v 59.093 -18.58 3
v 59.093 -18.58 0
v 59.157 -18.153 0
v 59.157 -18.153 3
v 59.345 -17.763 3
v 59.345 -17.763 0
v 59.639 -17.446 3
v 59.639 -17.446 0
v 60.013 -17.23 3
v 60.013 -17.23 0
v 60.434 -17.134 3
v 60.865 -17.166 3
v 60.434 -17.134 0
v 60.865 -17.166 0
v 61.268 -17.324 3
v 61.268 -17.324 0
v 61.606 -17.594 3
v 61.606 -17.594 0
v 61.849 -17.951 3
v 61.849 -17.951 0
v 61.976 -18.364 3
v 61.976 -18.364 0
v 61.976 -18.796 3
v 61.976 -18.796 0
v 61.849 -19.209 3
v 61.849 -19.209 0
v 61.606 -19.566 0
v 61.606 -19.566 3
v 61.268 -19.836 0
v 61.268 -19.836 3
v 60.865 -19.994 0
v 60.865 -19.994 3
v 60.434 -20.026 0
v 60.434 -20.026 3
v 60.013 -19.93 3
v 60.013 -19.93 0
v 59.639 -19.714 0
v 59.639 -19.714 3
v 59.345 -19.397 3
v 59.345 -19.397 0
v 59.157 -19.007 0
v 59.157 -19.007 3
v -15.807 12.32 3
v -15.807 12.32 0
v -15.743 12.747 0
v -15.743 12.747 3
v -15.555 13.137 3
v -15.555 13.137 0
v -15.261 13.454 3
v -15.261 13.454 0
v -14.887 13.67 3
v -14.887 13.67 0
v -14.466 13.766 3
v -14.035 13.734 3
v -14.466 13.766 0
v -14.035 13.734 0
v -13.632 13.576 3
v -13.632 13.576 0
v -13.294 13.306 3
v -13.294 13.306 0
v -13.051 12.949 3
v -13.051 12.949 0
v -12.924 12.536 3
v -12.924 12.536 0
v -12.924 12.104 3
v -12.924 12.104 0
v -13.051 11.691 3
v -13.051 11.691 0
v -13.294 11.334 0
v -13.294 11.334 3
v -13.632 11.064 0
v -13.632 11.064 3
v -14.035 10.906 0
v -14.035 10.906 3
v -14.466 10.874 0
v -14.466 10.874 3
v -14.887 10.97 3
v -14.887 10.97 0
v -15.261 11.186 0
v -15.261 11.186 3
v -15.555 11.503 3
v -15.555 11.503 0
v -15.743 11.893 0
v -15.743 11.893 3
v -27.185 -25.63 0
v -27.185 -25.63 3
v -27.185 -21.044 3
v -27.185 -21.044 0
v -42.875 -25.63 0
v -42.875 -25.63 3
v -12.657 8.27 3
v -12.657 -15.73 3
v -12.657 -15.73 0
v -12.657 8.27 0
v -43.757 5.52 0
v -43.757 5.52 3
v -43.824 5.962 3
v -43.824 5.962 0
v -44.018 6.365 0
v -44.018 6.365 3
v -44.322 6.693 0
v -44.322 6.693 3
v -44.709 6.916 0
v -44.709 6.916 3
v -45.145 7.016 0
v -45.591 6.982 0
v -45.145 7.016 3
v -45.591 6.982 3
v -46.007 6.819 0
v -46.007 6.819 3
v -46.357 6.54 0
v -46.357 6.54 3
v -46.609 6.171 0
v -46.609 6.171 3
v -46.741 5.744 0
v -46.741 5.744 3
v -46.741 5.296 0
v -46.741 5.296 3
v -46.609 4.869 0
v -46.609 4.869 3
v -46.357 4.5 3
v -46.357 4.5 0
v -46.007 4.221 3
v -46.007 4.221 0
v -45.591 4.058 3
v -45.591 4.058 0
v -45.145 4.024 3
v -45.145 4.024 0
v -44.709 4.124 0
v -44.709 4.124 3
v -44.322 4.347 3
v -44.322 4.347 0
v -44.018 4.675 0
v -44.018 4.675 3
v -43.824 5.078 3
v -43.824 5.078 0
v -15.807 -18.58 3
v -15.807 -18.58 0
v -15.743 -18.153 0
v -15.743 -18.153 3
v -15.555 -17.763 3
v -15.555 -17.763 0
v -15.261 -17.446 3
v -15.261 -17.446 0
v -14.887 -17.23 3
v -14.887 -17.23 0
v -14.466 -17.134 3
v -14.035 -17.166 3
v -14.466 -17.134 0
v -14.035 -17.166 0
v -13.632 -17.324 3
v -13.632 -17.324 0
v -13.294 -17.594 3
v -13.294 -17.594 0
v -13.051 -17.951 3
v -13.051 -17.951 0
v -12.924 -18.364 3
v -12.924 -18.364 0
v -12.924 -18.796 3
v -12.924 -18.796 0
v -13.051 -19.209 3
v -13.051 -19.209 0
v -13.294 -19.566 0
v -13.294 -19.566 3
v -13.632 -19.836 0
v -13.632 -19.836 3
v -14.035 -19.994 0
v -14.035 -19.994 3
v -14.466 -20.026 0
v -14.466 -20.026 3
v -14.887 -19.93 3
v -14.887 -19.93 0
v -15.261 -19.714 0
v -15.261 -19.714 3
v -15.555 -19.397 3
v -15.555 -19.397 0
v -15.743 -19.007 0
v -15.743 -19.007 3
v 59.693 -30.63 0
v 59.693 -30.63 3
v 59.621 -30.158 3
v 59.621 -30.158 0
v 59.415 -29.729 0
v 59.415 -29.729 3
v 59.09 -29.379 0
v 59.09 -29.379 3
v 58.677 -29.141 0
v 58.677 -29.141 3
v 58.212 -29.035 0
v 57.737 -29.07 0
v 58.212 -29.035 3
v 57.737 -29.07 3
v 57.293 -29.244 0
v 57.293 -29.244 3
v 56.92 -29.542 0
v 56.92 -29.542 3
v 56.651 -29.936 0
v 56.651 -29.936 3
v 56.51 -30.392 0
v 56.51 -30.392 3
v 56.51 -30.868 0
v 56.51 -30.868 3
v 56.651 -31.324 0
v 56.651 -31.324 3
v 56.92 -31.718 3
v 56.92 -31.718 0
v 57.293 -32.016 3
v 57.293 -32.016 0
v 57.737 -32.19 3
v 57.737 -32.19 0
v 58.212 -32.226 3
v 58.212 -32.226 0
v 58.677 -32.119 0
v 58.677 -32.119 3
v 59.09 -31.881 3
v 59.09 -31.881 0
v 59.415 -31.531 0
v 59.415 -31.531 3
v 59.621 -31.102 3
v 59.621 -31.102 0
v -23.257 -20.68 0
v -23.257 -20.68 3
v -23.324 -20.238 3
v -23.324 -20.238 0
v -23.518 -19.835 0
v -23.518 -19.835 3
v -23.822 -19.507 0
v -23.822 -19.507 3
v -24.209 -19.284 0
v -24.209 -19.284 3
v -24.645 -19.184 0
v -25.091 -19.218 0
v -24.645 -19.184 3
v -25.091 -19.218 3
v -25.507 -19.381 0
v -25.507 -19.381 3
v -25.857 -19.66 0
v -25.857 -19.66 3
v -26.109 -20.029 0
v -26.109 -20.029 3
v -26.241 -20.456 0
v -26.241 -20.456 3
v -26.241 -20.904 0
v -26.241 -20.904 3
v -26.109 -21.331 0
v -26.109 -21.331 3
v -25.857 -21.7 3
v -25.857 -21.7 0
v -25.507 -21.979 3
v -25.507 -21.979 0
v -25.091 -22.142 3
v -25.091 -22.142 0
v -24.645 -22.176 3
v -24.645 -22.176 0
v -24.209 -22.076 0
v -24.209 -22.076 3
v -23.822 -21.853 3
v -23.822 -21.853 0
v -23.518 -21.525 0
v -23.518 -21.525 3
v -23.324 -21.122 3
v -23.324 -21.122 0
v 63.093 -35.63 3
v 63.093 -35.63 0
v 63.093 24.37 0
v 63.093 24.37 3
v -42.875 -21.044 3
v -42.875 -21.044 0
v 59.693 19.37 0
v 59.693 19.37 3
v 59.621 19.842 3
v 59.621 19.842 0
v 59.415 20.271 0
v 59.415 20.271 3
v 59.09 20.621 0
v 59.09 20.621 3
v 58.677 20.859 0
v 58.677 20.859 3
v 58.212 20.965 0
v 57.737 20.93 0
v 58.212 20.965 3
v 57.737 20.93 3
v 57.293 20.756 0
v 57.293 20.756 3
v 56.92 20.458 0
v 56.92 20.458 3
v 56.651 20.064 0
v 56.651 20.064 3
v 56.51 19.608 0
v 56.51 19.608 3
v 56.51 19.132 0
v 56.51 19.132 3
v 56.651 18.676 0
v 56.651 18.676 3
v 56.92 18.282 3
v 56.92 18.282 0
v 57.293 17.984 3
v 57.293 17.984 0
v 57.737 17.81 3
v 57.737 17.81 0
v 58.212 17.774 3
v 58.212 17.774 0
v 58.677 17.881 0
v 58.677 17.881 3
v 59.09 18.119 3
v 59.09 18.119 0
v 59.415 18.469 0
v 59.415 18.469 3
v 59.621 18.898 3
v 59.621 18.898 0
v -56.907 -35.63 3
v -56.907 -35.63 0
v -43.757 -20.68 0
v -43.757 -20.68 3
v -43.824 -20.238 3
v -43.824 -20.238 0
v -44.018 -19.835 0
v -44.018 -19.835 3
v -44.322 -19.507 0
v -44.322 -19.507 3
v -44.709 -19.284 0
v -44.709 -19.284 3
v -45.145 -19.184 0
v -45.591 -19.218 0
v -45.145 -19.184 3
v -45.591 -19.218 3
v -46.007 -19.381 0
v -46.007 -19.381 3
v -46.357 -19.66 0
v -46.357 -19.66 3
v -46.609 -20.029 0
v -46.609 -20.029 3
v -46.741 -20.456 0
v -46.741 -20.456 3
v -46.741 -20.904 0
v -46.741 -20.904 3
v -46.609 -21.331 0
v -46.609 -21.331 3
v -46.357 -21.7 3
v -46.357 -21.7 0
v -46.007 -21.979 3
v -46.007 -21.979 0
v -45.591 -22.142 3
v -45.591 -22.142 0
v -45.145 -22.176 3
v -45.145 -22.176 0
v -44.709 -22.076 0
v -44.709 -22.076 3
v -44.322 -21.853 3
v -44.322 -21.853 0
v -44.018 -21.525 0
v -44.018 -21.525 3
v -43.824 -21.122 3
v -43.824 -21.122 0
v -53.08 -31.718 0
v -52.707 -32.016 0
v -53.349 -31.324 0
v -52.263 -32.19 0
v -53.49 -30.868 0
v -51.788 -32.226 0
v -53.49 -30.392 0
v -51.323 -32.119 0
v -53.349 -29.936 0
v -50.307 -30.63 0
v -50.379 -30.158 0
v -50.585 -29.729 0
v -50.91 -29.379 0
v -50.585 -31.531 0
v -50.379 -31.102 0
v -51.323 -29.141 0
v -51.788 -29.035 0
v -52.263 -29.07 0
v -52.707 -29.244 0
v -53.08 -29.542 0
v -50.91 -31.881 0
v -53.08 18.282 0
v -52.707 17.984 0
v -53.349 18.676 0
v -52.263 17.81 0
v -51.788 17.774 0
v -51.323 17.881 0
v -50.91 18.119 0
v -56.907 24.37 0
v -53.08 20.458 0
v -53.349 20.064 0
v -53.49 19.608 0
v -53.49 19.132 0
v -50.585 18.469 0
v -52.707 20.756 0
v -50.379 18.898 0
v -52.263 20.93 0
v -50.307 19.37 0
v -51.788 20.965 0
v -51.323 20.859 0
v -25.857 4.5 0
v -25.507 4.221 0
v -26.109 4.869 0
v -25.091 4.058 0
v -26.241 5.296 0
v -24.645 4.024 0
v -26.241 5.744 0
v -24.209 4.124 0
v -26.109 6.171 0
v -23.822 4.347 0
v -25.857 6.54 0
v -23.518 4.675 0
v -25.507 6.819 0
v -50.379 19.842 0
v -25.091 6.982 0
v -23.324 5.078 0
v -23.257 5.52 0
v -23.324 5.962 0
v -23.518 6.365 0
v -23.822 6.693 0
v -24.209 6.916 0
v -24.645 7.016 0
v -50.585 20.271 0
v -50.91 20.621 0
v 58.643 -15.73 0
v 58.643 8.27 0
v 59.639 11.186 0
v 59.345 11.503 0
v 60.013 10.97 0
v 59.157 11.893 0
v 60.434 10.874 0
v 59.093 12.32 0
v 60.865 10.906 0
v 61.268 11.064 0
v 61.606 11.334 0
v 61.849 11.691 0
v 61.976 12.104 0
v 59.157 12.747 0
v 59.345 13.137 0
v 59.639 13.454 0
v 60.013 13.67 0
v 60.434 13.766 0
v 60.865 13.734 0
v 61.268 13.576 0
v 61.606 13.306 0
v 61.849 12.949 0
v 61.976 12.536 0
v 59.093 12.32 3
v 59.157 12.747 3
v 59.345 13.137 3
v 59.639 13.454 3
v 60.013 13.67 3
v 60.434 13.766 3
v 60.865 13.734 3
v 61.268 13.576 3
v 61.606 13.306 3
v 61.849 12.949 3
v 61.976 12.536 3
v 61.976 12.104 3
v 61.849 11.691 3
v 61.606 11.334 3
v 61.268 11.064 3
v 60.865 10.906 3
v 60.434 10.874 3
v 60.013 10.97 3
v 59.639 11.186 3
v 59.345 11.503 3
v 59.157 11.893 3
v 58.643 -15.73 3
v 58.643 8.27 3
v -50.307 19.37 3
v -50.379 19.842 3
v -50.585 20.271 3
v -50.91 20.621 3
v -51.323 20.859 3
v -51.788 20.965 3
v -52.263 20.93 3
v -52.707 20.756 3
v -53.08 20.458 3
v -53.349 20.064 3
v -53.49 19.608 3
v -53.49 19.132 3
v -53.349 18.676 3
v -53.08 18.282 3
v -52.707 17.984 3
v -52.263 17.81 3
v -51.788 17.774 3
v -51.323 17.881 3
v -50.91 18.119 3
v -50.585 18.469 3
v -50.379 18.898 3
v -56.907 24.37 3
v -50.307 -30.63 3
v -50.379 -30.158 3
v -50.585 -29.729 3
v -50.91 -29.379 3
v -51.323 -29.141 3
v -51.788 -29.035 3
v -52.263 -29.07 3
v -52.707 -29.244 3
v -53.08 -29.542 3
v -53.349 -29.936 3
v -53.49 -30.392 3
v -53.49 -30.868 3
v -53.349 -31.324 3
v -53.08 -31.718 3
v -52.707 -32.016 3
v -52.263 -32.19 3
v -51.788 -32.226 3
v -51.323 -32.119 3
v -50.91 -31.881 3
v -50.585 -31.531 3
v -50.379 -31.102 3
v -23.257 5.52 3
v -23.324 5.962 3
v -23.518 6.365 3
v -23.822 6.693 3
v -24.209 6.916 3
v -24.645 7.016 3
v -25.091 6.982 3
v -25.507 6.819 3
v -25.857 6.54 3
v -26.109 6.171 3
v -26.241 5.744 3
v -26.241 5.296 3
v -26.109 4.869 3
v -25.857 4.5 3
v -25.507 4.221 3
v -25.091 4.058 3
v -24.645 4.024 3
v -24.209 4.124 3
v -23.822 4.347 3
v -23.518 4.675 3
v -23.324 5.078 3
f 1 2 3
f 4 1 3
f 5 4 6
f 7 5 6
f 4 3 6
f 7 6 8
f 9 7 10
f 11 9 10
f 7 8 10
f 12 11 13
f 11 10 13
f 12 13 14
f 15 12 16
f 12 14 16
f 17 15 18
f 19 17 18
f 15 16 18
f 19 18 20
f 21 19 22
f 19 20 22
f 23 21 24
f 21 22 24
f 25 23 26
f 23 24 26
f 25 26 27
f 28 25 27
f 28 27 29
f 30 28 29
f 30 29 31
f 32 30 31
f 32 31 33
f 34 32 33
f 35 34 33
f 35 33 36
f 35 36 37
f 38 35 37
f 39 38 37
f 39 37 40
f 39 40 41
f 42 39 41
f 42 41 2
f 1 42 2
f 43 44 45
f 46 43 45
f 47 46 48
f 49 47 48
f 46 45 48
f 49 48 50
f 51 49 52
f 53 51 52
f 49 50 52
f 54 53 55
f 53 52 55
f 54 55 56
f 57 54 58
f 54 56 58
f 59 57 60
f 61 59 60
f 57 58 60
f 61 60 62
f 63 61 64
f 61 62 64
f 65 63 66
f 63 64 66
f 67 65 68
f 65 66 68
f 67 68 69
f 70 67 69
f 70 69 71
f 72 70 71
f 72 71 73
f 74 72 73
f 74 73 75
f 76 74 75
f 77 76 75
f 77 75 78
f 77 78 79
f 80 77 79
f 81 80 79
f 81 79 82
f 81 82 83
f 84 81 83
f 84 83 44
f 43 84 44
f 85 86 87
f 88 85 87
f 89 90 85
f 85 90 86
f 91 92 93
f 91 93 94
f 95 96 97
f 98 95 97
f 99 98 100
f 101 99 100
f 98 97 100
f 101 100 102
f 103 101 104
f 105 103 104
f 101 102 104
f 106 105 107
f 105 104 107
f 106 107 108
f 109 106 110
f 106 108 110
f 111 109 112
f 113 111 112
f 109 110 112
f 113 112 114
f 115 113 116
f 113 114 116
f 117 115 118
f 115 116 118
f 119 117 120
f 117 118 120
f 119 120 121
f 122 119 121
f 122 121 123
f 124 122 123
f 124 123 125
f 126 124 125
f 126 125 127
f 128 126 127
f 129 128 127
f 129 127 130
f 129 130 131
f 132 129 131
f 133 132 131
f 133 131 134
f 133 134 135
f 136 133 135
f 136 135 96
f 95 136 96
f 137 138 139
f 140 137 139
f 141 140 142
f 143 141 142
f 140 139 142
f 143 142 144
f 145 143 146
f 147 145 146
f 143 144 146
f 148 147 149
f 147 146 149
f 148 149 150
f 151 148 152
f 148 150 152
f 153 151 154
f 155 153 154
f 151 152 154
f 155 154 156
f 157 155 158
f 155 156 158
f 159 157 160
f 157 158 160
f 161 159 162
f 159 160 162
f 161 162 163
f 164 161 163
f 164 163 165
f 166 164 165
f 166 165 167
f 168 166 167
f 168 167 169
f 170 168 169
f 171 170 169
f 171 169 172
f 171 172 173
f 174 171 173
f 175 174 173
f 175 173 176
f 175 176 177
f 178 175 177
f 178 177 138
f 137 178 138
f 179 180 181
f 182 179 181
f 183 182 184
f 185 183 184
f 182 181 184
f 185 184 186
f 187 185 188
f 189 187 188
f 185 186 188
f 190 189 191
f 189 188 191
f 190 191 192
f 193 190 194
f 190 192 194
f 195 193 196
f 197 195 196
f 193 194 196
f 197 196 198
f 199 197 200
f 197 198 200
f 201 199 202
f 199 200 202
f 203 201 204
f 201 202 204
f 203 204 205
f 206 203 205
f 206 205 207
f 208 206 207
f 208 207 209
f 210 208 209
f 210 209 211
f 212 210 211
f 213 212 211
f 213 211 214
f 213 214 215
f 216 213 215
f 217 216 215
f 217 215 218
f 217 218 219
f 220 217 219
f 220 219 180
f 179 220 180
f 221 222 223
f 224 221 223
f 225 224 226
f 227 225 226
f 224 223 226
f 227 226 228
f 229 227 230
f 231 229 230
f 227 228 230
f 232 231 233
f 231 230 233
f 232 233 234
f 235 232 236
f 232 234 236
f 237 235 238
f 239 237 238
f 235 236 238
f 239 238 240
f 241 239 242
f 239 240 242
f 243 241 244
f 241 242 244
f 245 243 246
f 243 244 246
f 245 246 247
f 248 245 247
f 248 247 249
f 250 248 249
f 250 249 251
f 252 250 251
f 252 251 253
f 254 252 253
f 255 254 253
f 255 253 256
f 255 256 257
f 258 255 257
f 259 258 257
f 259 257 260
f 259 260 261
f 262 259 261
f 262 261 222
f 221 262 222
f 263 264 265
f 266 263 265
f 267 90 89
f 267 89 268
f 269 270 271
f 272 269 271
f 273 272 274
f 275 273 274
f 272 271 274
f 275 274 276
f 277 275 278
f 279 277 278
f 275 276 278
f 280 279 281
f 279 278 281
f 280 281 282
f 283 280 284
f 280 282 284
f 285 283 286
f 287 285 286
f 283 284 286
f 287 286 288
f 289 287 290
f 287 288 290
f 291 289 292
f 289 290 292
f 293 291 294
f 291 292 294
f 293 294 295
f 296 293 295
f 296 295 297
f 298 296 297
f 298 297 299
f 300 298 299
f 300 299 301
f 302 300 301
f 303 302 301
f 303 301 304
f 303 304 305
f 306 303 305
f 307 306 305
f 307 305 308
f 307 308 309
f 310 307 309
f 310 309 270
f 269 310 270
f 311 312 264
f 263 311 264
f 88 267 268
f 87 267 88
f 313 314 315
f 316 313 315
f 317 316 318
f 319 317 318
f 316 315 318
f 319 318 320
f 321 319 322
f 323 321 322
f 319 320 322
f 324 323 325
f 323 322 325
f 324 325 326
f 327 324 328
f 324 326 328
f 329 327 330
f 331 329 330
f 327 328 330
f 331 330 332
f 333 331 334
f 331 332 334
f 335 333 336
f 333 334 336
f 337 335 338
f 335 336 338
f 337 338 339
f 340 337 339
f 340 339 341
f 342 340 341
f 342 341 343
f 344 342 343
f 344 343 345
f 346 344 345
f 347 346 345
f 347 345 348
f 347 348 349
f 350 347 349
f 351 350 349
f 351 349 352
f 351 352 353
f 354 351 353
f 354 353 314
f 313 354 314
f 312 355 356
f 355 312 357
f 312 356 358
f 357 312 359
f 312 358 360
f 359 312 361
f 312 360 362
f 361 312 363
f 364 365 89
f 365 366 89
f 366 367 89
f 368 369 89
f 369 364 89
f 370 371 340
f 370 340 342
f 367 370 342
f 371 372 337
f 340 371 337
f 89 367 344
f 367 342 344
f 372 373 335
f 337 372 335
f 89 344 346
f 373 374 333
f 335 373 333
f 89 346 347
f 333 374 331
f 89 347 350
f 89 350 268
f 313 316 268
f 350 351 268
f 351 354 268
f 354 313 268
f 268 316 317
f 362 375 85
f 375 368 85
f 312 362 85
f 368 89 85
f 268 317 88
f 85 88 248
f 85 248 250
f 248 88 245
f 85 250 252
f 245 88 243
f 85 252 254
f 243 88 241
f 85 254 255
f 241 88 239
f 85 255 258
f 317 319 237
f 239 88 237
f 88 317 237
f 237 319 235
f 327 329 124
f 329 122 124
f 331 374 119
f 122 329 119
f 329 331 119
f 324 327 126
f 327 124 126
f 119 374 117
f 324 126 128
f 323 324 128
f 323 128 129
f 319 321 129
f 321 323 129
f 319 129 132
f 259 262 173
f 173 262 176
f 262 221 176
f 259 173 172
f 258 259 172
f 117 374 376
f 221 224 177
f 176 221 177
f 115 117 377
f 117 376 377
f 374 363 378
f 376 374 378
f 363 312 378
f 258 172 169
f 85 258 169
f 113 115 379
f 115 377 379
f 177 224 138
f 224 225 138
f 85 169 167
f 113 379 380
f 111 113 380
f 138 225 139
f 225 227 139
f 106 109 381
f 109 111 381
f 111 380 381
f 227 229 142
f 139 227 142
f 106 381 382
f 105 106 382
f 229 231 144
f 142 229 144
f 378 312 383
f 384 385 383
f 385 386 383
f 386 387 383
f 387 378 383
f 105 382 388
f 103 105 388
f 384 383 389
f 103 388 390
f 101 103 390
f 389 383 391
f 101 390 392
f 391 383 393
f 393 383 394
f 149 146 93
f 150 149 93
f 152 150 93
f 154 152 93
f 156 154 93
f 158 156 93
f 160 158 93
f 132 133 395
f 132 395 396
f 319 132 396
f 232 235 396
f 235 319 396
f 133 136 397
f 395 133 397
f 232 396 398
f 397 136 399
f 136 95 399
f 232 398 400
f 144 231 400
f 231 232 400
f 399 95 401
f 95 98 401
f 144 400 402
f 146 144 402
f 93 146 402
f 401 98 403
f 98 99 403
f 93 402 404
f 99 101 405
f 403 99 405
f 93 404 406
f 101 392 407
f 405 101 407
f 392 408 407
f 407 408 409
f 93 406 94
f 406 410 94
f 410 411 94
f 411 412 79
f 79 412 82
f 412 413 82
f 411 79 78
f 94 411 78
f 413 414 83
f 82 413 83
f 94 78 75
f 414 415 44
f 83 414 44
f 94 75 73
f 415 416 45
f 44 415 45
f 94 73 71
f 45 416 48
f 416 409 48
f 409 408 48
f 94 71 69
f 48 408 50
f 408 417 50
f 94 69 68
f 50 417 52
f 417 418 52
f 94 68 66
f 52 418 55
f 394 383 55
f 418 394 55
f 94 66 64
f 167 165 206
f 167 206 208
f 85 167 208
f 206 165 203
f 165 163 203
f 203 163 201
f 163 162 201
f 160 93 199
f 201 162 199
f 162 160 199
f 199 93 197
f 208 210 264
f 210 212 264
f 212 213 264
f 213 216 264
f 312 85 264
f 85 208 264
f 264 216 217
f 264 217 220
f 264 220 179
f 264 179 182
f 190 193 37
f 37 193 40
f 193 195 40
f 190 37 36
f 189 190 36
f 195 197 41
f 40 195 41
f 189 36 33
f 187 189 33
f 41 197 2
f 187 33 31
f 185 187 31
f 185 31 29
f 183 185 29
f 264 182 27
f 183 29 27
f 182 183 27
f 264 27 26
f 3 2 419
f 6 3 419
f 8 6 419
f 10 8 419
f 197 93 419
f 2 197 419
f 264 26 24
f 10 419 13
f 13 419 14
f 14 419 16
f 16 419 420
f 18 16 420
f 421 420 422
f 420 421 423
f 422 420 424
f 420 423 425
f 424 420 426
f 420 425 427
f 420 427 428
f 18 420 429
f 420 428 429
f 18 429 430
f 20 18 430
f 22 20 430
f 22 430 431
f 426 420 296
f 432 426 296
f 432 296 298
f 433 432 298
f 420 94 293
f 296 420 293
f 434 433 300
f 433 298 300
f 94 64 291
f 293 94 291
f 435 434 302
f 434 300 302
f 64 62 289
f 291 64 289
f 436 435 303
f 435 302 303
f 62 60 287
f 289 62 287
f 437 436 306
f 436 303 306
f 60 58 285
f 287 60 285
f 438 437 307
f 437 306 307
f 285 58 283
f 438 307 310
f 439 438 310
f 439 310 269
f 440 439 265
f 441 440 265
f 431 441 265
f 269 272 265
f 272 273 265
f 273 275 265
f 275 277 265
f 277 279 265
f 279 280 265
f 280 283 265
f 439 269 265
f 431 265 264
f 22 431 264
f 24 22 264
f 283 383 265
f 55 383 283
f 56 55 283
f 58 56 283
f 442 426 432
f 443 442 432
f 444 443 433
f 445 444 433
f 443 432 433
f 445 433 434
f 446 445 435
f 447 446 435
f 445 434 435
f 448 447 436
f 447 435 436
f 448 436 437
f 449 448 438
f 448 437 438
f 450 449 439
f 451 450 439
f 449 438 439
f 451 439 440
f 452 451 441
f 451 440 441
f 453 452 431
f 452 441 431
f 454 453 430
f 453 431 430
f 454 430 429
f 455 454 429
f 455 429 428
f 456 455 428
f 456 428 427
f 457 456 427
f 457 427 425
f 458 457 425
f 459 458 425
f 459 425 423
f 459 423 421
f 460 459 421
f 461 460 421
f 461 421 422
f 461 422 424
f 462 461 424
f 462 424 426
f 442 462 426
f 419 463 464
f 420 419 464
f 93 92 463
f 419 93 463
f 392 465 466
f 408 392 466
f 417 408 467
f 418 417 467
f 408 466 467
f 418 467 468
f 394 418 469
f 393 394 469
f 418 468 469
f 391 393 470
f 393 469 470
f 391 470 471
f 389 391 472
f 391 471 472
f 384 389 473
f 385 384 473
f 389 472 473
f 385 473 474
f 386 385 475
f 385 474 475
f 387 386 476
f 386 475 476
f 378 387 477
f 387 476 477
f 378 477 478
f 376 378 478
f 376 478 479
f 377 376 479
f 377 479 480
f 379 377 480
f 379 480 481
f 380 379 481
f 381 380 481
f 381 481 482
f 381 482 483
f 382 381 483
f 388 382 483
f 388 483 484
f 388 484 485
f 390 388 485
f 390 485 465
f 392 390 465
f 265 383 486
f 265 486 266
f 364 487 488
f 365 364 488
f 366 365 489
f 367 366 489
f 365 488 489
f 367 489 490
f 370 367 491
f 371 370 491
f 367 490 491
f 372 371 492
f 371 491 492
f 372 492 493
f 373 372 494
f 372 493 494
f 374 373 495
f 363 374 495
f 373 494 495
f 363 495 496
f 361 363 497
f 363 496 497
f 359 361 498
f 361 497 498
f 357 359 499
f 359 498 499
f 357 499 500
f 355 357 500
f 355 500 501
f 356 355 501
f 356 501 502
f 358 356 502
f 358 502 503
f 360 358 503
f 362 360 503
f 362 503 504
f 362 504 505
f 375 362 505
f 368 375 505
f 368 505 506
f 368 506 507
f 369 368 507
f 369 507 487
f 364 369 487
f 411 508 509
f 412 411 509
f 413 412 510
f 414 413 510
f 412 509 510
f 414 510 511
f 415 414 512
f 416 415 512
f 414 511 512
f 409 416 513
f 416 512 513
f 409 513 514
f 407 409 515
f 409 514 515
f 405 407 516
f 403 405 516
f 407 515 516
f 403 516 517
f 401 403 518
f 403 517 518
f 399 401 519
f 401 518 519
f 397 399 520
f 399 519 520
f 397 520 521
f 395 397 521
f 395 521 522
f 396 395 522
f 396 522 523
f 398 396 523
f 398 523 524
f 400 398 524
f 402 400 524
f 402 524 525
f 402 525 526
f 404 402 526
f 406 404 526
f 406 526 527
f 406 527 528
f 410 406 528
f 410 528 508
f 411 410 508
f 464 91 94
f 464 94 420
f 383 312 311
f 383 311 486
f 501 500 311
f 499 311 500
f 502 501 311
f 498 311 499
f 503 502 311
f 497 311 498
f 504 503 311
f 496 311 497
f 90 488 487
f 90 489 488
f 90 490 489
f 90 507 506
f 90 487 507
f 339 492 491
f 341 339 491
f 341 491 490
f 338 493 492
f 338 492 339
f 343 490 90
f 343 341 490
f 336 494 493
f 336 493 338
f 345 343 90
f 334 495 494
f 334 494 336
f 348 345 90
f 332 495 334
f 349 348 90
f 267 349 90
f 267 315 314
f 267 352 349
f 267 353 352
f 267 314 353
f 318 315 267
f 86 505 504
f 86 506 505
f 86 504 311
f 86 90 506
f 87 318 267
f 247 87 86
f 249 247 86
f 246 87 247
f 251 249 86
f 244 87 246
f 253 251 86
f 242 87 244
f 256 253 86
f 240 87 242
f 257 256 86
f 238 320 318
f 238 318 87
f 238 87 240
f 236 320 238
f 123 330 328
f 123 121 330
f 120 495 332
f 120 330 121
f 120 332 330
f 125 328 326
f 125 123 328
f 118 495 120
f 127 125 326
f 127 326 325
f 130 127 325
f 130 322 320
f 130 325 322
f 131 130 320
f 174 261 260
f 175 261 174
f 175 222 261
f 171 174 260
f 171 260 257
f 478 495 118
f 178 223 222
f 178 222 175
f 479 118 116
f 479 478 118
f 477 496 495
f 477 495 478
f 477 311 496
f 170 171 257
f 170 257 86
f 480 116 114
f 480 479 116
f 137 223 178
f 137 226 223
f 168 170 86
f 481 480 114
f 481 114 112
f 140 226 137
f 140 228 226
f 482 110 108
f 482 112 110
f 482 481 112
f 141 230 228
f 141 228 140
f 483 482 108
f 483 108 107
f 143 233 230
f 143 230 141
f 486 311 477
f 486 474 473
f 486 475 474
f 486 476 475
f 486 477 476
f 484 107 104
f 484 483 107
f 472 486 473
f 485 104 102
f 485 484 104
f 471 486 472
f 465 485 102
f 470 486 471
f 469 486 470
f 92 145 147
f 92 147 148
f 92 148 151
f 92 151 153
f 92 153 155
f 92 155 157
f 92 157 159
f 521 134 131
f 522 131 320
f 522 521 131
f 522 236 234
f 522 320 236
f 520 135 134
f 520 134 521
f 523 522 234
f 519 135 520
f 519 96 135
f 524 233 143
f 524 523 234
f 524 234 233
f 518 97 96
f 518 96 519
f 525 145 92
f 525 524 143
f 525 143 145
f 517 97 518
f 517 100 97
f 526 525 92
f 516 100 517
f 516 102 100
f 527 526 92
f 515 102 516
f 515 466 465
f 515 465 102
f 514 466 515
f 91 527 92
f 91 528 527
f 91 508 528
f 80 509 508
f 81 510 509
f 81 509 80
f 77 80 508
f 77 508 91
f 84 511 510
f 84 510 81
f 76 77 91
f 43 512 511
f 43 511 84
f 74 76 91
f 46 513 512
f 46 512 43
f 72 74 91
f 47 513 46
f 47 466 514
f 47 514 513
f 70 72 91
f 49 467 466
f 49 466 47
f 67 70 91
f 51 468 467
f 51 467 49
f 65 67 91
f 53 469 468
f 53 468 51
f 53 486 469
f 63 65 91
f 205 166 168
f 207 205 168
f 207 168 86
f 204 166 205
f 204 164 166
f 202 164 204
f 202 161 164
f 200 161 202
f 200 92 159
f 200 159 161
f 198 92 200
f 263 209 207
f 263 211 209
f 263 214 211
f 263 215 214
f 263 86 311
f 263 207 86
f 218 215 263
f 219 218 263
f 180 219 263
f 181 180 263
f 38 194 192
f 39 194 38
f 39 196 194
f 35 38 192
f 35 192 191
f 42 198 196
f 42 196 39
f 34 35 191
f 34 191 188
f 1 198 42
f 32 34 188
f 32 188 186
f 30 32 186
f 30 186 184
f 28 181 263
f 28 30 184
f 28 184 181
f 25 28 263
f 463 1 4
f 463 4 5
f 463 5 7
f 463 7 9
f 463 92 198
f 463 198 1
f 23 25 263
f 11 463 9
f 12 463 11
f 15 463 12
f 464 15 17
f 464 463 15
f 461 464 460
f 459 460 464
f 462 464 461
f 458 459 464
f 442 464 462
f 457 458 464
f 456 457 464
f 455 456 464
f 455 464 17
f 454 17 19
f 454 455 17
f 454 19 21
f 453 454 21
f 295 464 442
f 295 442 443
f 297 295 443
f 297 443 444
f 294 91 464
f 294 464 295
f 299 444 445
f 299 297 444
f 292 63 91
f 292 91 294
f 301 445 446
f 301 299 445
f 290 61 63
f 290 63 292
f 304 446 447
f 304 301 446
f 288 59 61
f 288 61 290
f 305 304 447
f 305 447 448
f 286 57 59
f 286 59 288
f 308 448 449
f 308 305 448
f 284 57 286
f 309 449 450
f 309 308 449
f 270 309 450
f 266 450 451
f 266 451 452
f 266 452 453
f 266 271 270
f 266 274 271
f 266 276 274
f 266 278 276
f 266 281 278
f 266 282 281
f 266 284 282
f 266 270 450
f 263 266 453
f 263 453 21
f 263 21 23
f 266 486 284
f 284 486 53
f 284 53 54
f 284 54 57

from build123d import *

# Parameters (mm, degrees)
SKETCH1_W           = 120
SKETCH1_H           = 60
BOSS_EXTRUDE1_DEPTH = 3
SKETCH3_R           = 1.6
CUT_EXTRUDE2_DEPTH  = 73.520148402
SKETCH5_R           = 1.45
CUT_EXTRUDE4_DEPTH  = 73.520148402
SKETCH7_W           = 71.3
SKETCH7_H           = 24
CUT_EXTRUDE5_DEPTH  = 73.520148402
SKETCH8_R           = 1.5
SKETCH8_W           = 15.689778119
SKETCH8_H           = 4.586192705
CUT_EXTRUDE6_DEPTH  = 73.520148402


with BuildPart() as part:
    # Sketch1 → Boss-Extrude1 (new body)
    with BuildSketch(Plane.XY):
        with Locations((3.092575742, -5.63002681)):
            Rectangle(SKETCH1_W, SKETCH1_H)
    extrude(amount=BOSS_EXTRUDE1_DEPTH)

    # Sketch3 → Cut-Extrude2 (cut, through all)
    with BuildSketch(Plane.XY.offset(3)):
        with Locations((58.092575742, 19.36997319)):
            Circle(SKETCH3_R)
        with Locations((58.092575742, -30.63002681)):
            Circle(SKETCH3_R)
        with Locations((-51.907424258, -30.63002681)):
            Circle(SKETCH3_R)
        with Locations((-51.907424258, 19.36997319)):
            Circle(SKETCH3_R)
    extrude(amount=-CUT_EXTRUDE2_DEPTH, mode=Mode.SUBTRACT)

    # Sketch5 → Cut-Extrude4 (cut, through all)
    with BuildSketch(Plane(origin=(0, 0, 0), x_dir=(-1, 0, 0), z_dir=(0, 0, -1))):
        with Locations((14.357424258, 12.31997319)):
            Circle(SKETCH5_R)
        with Locations((14.357424258, -18.58002681)):
            Circle(SKETCH5_R)
        with Locations((-60.542575742, -18.58002681)):
            Circle(SKETCH5_R)
        with Locations((-60.542575742, 12.31997319)):
            Circle(SKETCH5_R)
    extrude(amount=-CUT_EXTRUDE4_DEPTH, mode=Mode.SUBTRACT)

    # Sketch7 → Cut-Extrude5 (cut, through all)
    with BuildSketch(Plane.XY.offset(3)):
        with Locations((22.992575742, -3.73002681)):
            Rectangle(SKETCH7_W, SKETCH7_H)
    extrude(amount=-CUT_EXTRUDE5_DEPTH, mode=Mode.SUBTRACT)

    # Sketch8 → Cut-Extrude6 (cut, through all)
    with BuildSketch(Plane.XY.offset(3)):
        with Locations((-45.257424258, 5.51997319)):
            Circle(SKETCH8_R)
        with Locations((-24.757424258, 5.51997319)):
            Circle(SKETCH8_R)
        with Locations((-24.757424258, -20.68002681)):
            Circle(SKETCH8_R)
        with Locations((-45.257424258, -20.68002681)):
            Circle(SKETCH8_R)
        with Locations((-35.029761386, -23.336930458)):
            Rectangle(SKETCH8_W, SKETCH8_H)
    extrude(amount=-CUT_EXTRUDE6_DEPTH, mode=Mode.SUBTRACT)


solid = part.part
